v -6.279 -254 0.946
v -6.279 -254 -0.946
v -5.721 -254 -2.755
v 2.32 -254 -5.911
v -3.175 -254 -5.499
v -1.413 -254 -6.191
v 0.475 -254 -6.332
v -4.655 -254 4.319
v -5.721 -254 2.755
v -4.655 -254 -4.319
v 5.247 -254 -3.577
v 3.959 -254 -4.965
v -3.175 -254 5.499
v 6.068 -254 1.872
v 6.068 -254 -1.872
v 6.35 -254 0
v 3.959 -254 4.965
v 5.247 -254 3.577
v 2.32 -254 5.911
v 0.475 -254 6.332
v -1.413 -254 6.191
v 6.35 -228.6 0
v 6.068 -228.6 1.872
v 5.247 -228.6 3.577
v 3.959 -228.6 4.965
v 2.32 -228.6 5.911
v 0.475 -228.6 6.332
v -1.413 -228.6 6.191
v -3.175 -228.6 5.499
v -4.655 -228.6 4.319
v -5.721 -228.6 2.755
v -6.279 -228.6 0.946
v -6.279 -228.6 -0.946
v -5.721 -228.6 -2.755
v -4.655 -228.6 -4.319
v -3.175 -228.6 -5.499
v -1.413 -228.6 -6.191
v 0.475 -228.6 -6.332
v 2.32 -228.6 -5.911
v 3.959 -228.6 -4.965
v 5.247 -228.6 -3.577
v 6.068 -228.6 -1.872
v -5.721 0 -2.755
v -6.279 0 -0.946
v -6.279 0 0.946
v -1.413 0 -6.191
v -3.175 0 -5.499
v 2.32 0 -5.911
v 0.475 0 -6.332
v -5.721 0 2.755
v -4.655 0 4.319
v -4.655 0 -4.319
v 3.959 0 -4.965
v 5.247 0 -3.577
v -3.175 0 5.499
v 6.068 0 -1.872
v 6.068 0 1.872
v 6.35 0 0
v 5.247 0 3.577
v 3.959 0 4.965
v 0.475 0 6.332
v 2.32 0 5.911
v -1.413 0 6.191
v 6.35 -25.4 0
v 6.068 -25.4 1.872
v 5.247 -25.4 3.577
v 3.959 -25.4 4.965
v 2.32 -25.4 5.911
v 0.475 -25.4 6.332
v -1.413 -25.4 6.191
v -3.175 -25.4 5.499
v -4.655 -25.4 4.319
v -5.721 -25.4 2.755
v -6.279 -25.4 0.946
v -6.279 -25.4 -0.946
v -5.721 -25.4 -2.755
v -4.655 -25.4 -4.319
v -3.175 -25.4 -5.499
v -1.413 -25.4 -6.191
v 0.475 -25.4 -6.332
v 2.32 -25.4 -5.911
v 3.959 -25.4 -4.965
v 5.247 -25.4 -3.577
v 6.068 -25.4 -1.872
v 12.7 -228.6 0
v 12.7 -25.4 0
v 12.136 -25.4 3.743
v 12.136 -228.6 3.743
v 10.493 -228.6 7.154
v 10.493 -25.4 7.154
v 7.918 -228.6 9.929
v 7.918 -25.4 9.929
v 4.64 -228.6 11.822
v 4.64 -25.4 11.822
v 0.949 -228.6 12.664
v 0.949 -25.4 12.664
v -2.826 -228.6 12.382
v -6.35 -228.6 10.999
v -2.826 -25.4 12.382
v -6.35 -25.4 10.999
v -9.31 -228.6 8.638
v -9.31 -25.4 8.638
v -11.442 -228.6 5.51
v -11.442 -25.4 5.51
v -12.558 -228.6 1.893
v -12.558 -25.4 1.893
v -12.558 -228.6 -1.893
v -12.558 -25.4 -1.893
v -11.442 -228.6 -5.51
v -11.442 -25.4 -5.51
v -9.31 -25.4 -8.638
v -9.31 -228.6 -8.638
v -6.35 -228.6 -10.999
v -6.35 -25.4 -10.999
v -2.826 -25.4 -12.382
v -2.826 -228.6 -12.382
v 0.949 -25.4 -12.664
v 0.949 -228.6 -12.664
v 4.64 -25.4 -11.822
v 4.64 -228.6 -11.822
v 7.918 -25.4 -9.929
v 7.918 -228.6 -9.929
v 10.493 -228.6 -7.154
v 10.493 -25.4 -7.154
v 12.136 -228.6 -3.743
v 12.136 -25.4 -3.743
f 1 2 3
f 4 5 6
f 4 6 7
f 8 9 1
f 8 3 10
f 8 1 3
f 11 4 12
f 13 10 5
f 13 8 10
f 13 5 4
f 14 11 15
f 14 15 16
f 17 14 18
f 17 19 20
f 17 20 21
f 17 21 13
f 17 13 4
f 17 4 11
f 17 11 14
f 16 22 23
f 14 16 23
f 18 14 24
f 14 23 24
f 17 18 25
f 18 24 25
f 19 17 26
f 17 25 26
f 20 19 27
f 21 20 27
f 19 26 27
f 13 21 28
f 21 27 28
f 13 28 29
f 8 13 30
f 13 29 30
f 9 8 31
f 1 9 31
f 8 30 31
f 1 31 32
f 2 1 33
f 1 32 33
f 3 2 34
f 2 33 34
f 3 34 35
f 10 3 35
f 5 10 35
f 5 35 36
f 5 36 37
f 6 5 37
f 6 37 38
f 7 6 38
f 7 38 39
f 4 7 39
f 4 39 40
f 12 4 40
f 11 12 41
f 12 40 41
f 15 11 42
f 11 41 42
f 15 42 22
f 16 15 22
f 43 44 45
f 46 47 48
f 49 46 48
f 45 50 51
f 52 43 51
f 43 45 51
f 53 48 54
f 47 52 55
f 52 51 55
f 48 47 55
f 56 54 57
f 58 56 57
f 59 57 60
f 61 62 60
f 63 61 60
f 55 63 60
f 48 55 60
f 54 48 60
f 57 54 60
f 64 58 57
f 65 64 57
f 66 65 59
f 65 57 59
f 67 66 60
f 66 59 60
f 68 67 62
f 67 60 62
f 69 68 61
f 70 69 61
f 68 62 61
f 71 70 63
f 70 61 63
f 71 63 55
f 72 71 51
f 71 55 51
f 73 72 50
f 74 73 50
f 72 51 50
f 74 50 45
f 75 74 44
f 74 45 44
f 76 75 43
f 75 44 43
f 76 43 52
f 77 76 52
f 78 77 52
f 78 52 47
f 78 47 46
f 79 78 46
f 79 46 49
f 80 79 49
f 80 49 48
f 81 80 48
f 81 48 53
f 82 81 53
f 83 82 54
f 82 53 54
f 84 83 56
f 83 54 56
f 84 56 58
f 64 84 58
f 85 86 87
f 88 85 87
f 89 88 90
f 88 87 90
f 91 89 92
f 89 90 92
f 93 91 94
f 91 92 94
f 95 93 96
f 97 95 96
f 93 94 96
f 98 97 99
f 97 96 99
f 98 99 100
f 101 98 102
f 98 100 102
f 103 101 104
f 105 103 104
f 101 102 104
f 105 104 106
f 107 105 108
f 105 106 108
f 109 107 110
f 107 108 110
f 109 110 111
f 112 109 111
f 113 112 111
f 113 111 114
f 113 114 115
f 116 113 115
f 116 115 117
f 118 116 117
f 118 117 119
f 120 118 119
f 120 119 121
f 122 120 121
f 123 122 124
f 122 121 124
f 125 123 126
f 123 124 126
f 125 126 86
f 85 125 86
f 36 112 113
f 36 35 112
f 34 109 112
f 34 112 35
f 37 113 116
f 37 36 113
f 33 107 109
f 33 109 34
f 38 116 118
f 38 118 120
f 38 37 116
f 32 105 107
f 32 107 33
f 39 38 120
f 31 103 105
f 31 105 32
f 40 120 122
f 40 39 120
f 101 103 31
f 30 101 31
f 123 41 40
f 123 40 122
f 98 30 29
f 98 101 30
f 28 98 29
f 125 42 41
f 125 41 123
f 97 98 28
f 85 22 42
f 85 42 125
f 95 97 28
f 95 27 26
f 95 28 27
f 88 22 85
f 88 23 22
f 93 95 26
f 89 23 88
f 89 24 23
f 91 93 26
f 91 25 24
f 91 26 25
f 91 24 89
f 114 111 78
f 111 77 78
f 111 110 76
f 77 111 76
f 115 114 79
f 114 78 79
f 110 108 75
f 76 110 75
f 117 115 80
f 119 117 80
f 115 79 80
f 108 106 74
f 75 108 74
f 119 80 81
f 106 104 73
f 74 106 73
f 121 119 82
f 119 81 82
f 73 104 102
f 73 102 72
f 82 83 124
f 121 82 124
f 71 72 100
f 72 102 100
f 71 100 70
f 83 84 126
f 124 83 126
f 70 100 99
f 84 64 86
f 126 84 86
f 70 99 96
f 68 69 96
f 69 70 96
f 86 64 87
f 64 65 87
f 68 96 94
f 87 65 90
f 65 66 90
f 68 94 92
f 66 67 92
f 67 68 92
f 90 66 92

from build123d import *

# Parameters (mm, degrees)
F0_R     = 6.35
F1_DEPTH = 25.4
F2_R     = 12.7
F2_R_2   = 6.35
F3_DEPTH = 203.2
F4_R     = 6.35
F5_DEPTH = 25.4


with BuildPart() as f1:
    # F0 (on Front) → F1 (new body)
    with BuildSketch(Plane.XZ):
        Circle(F0_R)
    extrude(amount=F1_DEPTH)

    # F2 (on face) → F3 (join)
    with BuildSketch(Plane.XZ.offset(25.4)):
        Circle(F2_R)
        Circle(F2_R_2, mode=Mode.SUBTRACT)
        Circle(F2_R_2)
    extrude(amount=F3_DEPTH)

    # F4 (on face) → F5 (join)
    with BuildSketch(Plane.XZ.offset(228.6)):
        Circle(F4_R)
    extrude(amount=F5_DEPTH)


solid = f1.part
